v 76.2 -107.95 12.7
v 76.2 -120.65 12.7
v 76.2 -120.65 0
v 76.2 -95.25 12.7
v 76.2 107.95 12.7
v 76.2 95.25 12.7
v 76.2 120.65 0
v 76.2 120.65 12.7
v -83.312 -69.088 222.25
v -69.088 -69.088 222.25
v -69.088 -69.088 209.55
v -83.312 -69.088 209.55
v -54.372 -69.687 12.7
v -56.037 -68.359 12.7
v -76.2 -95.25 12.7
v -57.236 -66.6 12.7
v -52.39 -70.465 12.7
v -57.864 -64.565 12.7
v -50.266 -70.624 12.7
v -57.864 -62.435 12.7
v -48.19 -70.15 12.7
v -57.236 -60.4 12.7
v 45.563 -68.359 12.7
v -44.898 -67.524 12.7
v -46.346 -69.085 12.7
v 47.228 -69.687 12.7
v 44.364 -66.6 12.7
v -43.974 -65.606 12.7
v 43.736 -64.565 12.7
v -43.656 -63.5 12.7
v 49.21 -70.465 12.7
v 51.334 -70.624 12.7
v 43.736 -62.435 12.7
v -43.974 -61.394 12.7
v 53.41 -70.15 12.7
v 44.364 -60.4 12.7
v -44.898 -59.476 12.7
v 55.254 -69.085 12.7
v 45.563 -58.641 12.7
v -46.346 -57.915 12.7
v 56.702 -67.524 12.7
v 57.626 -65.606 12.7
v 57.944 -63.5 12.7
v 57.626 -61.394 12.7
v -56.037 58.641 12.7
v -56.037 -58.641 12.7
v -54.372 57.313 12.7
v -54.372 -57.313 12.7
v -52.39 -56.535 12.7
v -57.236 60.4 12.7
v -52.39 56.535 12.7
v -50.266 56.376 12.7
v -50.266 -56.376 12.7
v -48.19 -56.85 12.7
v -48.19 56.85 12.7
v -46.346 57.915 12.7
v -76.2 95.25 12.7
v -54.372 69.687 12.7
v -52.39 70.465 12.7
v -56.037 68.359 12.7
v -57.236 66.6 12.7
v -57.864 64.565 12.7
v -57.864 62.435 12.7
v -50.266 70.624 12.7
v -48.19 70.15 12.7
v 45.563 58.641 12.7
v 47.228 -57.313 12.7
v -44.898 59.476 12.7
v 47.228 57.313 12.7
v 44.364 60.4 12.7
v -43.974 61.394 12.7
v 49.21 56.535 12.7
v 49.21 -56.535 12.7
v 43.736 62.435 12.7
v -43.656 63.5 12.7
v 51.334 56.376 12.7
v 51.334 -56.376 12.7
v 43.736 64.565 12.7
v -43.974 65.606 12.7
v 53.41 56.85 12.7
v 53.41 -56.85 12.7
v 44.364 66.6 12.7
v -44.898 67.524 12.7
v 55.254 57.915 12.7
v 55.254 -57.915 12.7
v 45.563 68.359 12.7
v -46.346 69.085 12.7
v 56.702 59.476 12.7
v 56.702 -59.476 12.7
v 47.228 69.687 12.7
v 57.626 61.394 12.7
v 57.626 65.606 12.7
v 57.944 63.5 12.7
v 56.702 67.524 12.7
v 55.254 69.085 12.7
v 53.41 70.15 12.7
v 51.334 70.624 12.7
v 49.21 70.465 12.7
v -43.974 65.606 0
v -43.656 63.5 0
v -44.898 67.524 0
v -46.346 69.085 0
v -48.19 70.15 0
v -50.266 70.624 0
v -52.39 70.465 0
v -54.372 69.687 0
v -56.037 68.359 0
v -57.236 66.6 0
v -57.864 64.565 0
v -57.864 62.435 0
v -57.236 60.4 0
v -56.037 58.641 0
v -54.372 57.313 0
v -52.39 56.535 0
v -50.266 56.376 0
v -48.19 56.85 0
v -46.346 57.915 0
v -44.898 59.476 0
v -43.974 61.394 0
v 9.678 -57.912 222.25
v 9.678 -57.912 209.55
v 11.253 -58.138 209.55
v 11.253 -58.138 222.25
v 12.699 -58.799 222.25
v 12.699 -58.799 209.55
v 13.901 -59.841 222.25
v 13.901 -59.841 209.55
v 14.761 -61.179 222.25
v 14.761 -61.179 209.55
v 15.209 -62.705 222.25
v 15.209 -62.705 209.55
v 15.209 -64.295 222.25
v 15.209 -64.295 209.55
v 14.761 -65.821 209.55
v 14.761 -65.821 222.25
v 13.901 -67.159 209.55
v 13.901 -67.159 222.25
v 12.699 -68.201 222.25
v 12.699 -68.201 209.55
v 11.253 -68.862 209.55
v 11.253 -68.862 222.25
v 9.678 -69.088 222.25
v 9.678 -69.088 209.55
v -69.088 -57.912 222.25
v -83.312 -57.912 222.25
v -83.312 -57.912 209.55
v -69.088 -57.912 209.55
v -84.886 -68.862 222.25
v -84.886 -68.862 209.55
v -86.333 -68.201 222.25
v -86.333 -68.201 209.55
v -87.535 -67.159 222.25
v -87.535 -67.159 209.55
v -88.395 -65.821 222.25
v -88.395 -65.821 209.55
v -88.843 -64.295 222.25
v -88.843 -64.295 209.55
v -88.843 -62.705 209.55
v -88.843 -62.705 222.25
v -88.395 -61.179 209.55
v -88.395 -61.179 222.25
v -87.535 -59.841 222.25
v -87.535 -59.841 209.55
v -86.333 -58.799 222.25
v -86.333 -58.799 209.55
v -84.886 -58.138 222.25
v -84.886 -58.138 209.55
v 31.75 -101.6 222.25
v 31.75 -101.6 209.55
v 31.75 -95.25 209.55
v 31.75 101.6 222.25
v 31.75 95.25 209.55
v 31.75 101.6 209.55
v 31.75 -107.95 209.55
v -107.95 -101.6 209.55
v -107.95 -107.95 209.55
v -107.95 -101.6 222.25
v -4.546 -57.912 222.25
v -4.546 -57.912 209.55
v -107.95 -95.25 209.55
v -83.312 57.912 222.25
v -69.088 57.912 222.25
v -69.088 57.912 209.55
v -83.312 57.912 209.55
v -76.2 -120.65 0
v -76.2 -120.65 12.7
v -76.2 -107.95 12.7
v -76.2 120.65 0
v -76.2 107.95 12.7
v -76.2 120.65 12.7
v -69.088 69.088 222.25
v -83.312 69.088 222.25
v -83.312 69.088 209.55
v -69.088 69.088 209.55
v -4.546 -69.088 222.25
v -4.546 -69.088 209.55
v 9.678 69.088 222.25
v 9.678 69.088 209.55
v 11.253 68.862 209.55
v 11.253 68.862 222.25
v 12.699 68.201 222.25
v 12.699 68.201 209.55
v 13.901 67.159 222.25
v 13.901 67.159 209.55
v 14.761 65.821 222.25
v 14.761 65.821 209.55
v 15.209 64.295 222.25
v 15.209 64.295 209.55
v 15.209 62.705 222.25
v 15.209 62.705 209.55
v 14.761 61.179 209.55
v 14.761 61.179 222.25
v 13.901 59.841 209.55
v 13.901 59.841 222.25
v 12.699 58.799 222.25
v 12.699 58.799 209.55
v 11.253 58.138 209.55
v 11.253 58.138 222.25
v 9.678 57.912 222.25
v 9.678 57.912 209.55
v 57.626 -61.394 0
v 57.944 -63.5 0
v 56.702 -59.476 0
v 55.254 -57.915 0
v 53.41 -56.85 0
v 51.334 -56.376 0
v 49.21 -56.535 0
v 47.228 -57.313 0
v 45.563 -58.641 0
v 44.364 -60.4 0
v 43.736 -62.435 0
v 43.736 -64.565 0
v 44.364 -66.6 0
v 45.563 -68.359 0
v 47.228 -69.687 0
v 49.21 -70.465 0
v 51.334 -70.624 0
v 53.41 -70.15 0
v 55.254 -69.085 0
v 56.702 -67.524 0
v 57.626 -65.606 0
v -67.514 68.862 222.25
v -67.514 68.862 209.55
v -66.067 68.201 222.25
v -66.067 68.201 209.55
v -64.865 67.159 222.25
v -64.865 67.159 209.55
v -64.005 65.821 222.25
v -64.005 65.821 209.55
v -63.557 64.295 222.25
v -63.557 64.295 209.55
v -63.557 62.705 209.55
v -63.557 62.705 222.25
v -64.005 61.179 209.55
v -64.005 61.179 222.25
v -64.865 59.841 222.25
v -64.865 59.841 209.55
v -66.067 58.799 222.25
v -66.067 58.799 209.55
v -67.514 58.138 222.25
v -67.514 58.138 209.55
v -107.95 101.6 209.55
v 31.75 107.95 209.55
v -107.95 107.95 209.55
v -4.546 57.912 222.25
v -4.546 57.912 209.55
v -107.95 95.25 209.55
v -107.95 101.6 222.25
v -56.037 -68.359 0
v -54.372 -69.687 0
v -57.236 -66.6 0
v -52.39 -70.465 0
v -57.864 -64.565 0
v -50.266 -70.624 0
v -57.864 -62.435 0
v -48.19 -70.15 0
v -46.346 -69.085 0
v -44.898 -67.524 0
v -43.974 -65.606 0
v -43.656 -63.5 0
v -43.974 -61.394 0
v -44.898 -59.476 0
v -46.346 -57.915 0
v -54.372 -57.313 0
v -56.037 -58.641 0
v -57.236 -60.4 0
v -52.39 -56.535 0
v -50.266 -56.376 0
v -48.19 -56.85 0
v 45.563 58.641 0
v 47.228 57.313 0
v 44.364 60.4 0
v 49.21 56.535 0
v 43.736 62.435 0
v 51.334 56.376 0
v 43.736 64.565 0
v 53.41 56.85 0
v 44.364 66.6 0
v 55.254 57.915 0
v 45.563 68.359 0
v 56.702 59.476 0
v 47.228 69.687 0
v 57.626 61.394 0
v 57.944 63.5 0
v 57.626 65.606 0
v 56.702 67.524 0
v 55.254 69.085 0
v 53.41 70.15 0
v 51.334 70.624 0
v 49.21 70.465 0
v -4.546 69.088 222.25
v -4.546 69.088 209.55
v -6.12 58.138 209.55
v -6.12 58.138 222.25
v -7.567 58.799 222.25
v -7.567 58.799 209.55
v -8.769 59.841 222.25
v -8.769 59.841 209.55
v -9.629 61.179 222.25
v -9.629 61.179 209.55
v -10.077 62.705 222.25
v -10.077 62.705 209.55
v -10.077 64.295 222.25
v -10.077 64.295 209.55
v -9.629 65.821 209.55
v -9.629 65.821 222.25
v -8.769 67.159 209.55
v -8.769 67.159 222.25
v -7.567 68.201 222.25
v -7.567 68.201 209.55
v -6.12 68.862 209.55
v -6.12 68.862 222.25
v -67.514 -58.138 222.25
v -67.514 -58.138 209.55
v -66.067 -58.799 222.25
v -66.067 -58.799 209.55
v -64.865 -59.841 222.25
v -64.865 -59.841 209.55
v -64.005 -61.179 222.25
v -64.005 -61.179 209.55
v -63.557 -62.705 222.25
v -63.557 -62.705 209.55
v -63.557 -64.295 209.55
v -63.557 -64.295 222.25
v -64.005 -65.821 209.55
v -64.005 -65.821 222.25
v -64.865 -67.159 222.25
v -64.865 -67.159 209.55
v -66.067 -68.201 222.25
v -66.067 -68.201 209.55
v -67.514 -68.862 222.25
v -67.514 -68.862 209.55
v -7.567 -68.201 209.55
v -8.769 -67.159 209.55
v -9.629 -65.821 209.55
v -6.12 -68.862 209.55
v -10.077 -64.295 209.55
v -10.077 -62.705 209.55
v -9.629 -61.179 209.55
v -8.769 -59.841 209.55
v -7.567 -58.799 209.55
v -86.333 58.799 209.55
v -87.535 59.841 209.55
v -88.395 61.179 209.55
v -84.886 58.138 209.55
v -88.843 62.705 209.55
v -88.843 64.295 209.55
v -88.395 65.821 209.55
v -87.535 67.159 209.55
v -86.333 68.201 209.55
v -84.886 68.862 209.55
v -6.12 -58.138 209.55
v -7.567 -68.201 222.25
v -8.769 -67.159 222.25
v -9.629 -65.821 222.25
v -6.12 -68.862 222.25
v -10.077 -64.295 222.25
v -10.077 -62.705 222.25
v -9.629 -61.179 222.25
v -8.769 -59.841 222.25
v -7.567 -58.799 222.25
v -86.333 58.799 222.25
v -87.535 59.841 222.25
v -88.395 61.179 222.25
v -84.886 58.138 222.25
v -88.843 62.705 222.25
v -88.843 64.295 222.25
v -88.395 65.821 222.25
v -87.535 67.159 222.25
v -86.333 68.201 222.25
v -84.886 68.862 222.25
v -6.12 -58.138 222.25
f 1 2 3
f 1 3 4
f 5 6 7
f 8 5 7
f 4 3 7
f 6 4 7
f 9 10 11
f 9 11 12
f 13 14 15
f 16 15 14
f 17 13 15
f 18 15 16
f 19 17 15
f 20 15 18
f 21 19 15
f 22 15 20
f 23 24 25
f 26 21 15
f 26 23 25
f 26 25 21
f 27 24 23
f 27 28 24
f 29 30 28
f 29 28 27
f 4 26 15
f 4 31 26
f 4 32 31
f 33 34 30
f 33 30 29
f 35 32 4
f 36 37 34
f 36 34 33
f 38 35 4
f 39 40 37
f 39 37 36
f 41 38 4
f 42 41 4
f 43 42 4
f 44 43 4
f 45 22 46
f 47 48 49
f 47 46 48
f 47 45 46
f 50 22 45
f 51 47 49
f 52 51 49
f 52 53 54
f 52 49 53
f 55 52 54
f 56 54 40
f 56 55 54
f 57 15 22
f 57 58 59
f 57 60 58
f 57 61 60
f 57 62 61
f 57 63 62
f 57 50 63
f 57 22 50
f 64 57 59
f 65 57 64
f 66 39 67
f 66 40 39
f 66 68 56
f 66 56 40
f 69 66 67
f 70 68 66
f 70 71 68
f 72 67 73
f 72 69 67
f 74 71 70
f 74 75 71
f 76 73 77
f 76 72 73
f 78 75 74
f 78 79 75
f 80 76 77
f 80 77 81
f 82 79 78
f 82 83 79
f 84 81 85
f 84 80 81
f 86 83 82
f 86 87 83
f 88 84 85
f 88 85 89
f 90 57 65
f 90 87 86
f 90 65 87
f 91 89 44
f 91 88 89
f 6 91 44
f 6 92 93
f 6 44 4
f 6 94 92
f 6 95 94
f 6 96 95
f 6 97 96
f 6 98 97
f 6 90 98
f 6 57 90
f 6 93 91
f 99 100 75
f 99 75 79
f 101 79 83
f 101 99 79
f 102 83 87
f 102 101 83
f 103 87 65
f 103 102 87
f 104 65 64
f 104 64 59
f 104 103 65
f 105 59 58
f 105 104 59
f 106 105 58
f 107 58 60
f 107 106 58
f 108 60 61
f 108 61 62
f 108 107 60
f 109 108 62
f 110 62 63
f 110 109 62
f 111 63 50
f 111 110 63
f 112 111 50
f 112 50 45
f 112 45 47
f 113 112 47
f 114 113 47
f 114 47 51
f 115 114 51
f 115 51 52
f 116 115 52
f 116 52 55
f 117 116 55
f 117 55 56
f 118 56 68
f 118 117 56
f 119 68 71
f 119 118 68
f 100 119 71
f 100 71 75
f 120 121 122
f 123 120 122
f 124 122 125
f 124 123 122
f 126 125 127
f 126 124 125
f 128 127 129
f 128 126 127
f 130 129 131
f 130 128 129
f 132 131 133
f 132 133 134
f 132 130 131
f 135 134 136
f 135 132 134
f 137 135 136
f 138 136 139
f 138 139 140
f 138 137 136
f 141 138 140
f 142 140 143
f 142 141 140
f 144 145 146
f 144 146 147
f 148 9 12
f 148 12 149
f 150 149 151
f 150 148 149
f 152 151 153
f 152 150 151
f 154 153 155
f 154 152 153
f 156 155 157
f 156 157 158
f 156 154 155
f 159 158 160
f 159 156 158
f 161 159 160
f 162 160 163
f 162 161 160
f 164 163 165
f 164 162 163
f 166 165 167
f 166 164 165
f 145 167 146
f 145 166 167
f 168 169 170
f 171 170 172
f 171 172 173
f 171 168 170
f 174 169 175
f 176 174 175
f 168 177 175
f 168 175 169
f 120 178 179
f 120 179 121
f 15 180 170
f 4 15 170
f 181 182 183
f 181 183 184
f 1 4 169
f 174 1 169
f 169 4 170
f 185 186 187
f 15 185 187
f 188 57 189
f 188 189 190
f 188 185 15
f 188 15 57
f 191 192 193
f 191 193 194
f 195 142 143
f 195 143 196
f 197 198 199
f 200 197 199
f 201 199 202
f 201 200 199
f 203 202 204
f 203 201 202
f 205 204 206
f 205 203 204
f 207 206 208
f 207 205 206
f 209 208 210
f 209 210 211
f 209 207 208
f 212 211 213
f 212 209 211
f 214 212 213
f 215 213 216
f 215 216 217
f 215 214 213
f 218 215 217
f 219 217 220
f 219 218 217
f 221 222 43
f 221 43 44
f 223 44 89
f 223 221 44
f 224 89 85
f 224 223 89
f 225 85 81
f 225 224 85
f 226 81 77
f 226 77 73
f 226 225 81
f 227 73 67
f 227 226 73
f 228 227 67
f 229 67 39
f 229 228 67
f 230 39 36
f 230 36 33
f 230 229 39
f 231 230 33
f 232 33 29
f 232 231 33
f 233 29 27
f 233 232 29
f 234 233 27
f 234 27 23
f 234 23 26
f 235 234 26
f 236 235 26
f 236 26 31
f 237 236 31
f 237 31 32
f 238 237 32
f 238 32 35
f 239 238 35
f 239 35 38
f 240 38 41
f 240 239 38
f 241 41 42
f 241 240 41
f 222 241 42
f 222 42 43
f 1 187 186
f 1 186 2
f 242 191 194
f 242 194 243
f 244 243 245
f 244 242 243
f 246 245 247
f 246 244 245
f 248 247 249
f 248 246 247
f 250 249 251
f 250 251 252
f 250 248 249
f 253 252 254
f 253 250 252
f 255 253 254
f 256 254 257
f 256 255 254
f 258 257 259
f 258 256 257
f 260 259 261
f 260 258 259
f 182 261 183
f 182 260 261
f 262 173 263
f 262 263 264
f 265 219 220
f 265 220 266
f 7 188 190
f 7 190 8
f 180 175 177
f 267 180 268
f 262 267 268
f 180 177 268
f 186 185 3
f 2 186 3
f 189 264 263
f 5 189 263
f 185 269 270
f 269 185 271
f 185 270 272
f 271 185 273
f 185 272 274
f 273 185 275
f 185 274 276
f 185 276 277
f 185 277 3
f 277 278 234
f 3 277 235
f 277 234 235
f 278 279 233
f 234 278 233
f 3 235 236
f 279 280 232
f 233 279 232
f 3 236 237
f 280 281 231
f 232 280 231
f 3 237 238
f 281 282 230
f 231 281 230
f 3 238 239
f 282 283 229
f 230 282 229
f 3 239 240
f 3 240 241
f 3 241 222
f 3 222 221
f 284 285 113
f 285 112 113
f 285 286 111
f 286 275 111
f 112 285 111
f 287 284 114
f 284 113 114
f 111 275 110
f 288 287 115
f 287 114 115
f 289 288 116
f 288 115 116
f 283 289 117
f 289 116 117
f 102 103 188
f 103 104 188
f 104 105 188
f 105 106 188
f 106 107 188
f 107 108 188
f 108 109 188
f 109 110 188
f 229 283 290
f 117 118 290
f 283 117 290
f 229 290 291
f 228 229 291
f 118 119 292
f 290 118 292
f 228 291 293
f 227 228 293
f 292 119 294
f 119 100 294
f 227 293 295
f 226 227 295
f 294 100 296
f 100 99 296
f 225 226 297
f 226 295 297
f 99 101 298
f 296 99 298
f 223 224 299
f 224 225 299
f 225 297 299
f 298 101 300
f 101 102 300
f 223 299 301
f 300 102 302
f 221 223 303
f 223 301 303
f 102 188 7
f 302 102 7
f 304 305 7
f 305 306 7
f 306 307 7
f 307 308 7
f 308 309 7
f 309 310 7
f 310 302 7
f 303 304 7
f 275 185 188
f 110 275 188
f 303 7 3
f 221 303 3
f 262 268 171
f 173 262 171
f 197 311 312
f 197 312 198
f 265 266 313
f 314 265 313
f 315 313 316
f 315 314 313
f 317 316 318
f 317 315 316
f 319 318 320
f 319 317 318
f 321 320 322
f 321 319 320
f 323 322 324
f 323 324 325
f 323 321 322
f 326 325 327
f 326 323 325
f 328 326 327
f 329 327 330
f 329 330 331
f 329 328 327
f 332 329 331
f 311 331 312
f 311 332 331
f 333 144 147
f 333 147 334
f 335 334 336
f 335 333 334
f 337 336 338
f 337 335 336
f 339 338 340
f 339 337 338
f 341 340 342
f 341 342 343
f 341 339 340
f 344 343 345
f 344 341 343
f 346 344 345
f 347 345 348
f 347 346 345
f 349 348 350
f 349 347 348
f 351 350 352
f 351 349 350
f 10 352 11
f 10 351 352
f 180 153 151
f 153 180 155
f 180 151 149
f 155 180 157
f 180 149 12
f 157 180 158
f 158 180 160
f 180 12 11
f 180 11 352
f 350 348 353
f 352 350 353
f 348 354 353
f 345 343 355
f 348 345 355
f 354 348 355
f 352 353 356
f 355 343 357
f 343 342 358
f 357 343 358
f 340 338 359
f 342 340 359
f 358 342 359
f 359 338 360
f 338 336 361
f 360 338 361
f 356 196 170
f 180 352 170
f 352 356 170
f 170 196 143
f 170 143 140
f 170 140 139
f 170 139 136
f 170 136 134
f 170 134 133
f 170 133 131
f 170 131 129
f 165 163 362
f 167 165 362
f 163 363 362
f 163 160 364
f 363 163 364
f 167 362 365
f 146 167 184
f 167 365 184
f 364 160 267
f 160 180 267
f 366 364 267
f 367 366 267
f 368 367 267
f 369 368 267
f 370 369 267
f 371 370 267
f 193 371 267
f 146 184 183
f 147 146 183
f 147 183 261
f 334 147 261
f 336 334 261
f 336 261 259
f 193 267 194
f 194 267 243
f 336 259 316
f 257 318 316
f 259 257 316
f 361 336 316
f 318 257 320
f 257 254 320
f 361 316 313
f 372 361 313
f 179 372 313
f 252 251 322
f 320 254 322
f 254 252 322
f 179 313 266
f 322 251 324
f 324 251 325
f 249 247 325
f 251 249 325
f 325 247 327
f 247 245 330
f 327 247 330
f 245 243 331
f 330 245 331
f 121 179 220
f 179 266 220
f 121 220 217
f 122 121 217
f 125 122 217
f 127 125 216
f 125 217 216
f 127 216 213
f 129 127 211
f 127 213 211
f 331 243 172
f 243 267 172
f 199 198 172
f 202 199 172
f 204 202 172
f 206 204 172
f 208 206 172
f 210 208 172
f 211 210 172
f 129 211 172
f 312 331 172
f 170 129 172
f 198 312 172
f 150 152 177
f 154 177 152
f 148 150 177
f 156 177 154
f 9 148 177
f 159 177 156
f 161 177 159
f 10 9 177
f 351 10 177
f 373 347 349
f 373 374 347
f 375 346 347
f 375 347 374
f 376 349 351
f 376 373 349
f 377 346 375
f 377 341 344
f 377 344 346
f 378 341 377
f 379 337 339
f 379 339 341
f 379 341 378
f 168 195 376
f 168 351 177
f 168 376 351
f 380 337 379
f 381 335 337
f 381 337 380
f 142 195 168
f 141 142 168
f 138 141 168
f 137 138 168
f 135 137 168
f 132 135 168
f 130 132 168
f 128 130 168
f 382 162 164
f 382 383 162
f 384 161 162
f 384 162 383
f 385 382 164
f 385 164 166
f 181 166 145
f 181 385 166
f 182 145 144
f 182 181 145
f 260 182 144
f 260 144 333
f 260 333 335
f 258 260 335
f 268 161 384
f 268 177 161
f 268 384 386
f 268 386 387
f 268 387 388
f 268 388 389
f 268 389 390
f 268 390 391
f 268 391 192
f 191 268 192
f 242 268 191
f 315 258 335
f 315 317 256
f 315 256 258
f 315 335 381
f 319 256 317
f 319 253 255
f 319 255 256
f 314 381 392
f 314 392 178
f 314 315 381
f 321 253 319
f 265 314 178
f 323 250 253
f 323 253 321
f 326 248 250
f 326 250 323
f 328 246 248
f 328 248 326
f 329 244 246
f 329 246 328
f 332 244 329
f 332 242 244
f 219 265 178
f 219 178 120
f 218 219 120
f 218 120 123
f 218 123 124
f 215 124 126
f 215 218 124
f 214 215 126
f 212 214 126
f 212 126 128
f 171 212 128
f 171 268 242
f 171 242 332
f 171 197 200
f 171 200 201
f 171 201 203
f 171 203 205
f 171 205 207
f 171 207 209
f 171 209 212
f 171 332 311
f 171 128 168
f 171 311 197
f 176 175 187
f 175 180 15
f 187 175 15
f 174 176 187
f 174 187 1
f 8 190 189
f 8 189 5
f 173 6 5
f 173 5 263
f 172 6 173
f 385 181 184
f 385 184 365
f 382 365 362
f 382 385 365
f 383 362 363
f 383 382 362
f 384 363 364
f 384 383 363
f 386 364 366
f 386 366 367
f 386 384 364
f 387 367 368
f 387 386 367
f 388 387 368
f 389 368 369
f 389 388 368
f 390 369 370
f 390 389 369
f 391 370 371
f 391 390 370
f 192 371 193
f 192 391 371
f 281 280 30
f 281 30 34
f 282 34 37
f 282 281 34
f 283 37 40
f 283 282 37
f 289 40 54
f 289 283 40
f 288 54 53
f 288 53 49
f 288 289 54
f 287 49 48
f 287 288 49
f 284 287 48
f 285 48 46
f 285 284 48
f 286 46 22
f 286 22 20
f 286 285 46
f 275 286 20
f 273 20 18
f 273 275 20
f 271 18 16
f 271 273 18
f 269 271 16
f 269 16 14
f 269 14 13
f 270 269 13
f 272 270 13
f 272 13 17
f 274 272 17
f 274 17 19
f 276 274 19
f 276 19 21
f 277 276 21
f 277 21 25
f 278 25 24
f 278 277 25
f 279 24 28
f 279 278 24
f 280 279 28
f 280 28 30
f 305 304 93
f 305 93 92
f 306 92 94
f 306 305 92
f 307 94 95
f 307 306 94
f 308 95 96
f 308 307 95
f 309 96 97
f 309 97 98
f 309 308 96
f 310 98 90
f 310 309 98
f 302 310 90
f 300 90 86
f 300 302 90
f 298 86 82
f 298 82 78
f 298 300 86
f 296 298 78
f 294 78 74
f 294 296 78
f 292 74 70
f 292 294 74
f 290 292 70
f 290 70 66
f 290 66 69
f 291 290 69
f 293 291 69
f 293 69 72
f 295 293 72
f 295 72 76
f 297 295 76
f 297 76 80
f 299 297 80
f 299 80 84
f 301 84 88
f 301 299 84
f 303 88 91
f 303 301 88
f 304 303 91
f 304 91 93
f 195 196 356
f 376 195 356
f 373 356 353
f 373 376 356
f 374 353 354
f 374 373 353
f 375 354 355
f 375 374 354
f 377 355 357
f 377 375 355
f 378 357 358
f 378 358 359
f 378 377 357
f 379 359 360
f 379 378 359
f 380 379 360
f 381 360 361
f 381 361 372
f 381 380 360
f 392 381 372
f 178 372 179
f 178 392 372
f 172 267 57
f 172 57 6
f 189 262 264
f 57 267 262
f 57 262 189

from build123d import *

# Parameters (mm, degrees)
F0_W     = 152.4
F0_H     = 241.3
F0_R     = 7.14375
F1_DEPTH = 12.7
F3_W     = 139.7
F3_H     = 203.2
F4_DEPTH = 12.7
F7_DEPTH = 12.7


with BuildPart() as f1:
    # F0 (on Top) → F1 (new body)
    with BuildSketch(Plane.XY):
        Rectangle(F0_W, F0_H)
        with Locations((-50.8, -63.5)):
            Circle(F0_R, mode=Mode.SUBTRACT)
        with Locations((50.8, -63.5)):
            Circle(F0_R, mode=Mode.SUBTRACT)
        with Locations((-50.8, 63.5)):
            Circle(F0_R, mode=Mode.SUBTRACT)
        with Locations((50.8, 63.5)):
            Circle(F0_R, mode=Mode.SUBTRACT)
    extrude(amount=F1_DEPTH)



with BuildPart() as f4:
    # F3 (on offset) → F4 (new body)
    with BuildSketch(Plane.XY.offset(222.25)):
        with Locations((-38.1, 0)):
            Rectangle(F3_W, F3_H)
        with BuildLine():
            ThreePointArc((-83.312, -69.088), (-88.9, -63.5), (-83.312, -57.912))
            Line((-83.312, -57.912), (-69.088, -57.912))
            ThreePointArc((-69.088, -57.912), (-63.5, -63.5), (-69.088, -69.088))
            Line((-69.088, -69.088), (-83.312, -69.088))
        make_face(mode=Mode.SUBTRACT)
        with BuildLine():
            ThreePointArc((-4.5457187648, -69.088), (-10.1337187648, -63.5), (-4.5457187648, -57.912))
            Line((-4.5457187648, -57.912), (9.6782812352, -57.912))
            ThreePointArc((9.6782812352, -57.912), (15.2662812352, -63.5), (9.6782812352, -69.088))
            Line((9.6782812352, -69.088), (-4.5457187648, -69.088))
        make_face(mode=Mode.SUBTRACT)
        with BuildLine():
            Line((-69.088, 57.912), (-83.312, 57.912))
            ThreePointArc((-83.312, 57.912), (-88.9, 63.5), (-83.312, 69.088))
            Line((-83.312, 69.088), (-69.088, 69.088))
            ThreePointArc((-69.088, 69.088), (-63.5, 63.5), (-69.088, 57.912))
        make_face(mode=Mode.SUBTRACT)
        with BuildLine():
            Line((9.6782812352, 57.912), (-4.5457187648, 57.912))
            ThreePointArc((-4.5457187648, 57.912), (-10.1337187648, 63.5), (-4.5457187648, 69.088))
            Line((-4.5457187648, 69.088), (9.6782812352, 69.088))
            ThreePointArc((9.6782812352, 69.088), (15.2662812352, 63.5), (9.6782812352, 57.912))
        make_face(mode=Mode.SUBTRACT)
    extrude(amount=-F4_DEPTH)


with BuildPart() as f1_1:
    add(f1.part)

    add(f4.part)  # F7 merges F4
    # F6 (on offset) → F7 (join)
    with BuildSketch(Plane.XZ.offset(95.25)):
        Polygon((31.75, 209.55), (-107.95, 209.55), (-76.2, 12.7), (76.2, 12.7), align=None)
    extrude(amount=F7_DEPTH)

    # F8: F1 across plane


with BuildPart() as f1_2:
    add(f1_1.part)
    add(f1_1.part.mirror(Plane.XZ))


solid = f1_2.part
